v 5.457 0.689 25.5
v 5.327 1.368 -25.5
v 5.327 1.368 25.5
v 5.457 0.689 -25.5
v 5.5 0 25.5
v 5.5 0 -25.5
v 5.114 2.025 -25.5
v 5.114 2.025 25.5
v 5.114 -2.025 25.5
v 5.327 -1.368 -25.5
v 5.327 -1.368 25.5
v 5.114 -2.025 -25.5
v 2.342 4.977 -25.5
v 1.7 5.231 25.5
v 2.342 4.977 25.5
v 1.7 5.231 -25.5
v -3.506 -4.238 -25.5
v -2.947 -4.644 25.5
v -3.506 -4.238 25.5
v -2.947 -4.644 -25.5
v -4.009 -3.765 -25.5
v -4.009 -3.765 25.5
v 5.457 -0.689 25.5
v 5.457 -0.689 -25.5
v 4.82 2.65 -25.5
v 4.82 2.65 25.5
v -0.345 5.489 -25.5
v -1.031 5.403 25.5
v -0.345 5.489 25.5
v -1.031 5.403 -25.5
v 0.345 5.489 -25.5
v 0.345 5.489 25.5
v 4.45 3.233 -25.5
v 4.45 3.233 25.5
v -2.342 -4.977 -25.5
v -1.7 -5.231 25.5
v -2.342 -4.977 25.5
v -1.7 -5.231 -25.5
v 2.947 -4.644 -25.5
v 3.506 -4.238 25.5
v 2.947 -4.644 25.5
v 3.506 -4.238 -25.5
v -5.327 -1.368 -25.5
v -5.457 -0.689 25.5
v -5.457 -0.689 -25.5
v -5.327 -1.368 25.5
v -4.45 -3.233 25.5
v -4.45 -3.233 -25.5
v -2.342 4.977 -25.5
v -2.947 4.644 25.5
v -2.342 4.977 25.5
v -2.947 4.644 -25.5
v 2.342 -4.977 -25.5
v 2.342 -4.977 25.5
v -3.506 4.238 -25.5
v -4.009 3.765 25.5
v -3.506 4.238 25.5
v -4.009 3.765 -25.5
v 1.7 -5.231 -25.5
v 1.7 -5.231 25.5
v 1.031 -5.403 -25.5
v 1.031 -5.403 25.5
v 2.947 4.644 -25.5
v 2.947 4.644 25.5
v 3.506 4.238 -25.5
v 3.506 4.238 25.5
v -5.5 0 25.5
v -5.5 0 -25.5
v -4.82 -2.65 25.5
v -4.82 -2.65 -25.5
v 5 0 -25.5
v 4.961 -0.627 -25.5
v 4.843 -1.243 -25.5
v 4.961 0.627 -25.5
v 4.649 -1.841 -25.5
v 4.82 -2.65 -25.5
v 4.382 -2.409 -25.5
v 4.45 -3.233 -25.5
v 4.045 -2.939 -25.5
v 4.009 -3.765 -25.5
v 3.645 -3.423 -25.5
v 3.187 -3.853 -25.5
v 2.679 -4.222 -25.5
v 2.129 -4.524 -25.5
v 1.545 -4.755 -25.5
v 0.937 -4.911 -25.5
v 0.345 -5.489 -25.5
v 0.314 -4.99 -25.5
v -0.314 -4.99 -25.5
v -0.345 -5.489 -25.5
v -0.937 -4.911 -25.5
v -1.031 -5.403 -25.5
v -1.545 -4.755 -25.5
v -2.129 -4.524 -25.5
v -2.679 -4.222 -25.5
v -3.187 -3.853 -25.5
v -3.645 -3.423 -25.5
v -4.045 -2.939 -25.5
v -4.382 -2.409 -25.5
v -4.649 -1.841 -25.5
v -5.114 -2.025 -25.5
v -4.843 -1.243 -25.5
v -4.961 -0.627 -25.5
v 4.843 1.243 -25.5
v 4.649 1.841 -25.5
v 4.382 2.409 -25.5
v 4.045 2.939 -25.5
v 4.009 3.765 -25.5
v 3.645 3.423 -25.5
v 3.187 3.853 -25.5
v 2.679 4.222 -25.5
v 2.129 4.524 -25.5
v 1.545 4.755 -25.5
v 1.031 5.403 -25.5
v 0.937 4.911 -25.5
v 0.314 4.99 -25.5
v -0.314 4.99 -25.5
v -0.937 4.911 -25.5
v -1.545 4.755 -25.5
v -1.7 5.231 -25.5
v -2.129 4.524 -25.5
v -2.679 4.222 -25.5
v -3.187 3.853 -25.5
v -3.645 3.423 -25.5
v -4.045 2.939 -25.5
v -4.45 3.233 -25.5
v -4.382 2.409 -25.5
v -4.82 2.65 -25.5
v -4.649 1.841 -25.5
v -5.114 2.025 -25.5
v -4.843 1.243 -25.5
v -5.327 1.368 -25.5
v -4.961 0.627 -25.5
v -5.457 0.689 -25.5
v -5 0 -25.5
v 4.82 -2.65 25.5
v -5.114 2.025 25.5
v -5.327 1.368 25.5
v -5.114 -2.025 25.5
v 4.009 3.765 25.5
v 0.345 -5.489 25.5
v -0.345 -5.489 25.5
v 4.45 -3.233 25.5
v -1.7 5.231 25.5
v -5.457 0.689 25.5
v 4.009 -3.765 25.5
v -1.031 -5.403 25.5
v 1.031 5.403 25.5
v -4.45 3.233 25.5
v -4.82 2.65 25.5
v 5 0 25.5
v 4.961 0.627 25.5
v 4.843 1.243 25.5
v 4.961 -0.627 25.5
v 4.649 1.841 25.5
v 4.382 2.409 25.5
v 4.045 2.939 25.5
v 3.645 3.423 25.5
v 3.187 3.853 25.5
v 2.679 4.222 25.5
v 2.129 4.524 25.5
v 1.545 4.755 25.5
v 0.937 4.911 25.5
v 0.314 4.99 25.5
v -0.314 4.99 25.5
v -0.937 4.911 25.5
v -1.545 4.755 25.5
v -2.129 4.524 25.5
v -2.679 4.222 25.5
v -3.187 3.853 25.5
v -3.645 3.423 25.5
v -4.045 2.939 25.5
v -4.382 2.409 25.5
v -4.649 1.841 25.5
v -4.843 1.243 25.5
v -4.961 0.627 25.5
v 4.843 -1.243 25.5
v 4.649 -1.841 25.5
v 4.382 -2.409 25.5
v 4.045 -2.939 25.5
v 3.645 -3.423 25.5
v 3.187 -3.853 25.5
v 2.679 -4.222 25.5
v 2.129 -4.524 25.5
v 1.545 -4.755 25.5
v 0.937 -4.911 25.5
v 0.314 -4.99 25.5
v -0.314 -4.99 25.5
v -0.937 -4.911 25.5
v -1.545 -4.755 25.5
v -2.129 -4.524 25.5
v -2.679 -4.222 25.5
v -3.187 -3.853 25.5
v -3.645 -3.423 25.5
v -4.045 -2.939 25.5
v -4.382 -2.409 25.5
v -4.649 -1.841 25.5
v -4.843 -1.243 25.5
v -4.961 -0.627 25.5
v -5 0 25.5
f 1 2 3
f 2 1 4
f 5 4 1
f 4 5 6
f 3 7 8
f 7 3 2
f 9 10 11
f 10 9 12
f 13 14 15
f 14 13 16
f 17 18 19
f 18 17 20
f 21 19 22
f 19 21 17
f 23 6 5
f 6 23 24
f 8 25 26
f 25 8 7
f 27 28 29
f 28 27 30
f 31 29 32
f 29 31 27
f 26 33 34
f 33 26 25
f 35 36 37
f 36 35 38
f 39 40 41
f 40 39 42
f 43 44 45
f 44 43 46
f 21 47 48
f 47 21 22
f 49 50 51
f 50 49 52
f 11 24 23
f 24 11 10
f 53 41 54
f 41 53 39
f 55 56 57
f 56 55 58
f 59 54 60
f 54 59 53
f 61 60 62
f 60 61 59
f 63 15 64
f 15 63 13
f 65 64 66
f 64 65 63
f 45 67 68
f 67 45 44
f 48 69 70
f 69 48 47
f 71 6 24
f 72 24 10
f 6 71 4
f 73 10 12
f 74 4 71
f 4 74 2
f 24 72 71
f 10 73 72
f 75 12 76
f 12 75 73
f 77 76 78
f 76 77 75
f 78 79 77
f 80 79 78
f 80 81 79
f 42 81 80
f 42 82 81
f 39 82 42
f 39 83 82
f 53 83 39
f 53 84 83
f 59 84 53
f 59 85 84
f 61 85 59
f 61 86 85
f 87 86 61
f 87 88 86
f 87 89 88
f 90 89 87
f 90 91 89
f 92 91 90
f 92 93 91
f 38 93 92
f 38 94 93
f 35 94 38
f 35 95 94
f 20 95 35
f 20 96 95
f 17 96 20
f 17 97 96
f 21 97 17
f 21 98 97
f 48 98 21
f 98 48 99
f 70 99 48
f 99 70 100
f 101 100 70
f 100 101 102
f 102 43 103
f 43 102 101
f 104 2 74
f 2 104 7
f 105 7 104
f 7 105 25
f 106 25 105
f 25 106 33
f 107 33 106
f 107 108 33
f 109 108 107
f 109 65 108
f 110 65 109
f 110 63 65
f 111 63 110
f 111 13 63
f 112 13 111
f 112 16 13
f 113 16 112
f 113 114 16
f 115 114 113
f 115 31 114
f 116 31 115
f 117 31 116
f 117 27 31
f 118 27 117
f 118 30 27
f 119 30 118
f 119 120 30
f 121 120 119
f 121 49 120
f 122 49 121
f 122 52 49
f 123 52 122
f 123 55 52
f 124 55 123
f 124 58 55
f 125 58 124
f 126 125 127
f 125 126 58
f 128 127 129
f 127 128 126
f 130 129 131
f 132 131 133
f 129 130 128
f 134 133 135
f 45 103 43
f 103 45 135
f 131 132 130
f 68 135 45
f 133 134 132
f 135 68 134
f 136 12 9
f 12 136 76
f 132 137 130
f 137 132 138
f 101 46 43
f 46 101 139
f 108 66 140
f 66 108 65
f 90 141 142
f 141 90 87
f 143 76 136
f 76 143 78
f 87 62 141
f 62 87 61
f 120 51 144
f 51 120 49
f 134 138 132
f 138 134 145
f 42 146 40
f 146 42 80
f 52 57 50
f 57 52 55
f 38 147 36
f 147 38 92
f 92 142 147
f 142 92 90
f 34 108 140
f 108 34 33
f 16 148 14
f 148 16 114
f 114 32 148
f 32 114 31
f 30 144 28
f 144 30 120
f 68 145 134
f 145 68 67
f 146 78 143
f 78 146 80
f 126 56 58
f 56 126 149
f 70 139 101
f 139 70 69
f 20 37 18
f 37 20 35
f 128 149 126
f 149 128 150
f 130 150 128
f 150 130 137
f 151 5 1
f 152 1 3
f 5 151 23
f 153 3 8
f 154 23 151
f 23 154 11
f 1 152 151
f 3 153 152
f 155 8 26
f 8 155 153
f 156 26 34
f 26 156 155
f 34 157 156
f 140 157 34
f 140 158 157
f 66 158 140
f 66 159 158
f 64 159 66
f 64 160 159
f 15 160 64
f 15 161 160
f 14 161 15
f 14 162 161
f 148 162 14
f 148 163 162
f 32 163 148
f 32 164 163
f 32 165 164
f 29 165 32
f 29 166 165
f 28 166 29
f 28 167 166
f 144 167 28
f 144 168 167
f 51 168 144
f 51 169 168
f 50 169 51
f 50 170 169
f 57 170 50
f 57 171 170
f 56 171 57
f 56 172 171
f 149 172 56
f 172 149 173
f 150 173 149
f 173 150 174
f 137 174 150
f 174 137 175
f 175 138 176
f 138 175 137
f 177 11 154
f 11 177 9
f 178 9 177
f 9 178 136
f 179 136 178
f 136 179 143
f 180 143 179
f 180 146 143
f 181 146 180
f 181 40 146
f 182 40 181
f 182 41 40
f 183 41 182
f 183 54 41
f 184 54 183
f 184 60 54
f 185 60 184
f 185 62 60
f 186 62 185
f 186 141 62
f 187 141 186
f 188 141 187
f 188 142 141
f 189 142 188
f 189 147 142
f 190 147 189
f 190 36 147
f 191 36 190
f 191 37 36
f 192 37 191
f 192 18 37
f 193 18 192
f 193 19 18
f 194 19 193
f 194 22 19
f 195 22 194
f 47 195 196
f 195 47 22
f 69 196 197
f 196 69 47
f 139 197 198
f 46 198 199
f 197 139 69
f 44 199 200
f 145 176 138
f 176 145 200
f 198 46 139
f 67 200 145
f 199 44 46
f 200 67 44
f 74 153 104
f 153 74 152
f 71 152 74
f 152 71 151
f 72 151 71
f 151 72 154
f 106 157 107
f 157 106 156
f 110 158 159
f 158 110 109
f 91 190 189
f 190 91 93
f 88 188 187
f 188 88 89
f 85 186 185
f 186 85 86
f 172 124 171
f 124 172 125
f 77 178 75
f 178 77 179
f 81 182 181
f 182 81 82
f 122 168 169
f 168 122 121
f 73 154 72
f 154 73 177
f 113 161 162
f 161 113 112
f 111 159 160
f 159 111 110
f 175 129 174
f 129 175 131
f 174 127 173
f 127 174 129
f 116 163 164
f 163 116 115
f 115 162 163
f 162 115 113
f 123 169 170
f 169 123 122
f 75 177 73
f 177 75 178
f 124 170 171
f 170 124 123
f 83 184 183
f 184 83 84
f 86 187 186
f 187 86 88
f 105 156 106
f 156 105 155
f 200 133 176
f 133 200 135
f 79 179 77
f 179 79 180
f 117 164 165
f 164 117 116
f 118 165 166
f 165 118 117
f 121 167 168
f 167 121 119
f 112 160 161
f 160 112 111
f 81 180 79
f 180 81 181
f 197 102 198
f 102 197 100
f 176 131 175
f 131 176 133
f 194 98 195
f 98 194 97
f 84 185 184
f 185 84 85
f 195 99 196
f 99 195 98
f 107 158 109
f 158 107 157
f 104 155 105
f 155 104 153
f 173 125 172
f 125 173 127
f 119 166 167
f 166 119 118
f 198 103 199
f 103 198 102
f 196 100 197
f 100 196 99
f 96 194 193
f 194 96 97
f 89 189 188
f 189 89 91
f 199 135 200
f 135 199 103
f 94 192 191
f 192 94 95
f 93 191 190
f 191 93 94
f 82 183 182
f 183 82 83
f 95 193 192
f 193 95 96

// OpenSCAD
$fn = 50;


difference() {
	union() {
		translate(v = [0, 0, -25.5000000000]) {
			cylinder(h = 51, r = 5.5000000000);
		}
	}
	union() {
		translate(v = [0, 0, -100.0000000000]) {
			cylinder(h = 200, r = 5.0000000000);
		}
	}
}
